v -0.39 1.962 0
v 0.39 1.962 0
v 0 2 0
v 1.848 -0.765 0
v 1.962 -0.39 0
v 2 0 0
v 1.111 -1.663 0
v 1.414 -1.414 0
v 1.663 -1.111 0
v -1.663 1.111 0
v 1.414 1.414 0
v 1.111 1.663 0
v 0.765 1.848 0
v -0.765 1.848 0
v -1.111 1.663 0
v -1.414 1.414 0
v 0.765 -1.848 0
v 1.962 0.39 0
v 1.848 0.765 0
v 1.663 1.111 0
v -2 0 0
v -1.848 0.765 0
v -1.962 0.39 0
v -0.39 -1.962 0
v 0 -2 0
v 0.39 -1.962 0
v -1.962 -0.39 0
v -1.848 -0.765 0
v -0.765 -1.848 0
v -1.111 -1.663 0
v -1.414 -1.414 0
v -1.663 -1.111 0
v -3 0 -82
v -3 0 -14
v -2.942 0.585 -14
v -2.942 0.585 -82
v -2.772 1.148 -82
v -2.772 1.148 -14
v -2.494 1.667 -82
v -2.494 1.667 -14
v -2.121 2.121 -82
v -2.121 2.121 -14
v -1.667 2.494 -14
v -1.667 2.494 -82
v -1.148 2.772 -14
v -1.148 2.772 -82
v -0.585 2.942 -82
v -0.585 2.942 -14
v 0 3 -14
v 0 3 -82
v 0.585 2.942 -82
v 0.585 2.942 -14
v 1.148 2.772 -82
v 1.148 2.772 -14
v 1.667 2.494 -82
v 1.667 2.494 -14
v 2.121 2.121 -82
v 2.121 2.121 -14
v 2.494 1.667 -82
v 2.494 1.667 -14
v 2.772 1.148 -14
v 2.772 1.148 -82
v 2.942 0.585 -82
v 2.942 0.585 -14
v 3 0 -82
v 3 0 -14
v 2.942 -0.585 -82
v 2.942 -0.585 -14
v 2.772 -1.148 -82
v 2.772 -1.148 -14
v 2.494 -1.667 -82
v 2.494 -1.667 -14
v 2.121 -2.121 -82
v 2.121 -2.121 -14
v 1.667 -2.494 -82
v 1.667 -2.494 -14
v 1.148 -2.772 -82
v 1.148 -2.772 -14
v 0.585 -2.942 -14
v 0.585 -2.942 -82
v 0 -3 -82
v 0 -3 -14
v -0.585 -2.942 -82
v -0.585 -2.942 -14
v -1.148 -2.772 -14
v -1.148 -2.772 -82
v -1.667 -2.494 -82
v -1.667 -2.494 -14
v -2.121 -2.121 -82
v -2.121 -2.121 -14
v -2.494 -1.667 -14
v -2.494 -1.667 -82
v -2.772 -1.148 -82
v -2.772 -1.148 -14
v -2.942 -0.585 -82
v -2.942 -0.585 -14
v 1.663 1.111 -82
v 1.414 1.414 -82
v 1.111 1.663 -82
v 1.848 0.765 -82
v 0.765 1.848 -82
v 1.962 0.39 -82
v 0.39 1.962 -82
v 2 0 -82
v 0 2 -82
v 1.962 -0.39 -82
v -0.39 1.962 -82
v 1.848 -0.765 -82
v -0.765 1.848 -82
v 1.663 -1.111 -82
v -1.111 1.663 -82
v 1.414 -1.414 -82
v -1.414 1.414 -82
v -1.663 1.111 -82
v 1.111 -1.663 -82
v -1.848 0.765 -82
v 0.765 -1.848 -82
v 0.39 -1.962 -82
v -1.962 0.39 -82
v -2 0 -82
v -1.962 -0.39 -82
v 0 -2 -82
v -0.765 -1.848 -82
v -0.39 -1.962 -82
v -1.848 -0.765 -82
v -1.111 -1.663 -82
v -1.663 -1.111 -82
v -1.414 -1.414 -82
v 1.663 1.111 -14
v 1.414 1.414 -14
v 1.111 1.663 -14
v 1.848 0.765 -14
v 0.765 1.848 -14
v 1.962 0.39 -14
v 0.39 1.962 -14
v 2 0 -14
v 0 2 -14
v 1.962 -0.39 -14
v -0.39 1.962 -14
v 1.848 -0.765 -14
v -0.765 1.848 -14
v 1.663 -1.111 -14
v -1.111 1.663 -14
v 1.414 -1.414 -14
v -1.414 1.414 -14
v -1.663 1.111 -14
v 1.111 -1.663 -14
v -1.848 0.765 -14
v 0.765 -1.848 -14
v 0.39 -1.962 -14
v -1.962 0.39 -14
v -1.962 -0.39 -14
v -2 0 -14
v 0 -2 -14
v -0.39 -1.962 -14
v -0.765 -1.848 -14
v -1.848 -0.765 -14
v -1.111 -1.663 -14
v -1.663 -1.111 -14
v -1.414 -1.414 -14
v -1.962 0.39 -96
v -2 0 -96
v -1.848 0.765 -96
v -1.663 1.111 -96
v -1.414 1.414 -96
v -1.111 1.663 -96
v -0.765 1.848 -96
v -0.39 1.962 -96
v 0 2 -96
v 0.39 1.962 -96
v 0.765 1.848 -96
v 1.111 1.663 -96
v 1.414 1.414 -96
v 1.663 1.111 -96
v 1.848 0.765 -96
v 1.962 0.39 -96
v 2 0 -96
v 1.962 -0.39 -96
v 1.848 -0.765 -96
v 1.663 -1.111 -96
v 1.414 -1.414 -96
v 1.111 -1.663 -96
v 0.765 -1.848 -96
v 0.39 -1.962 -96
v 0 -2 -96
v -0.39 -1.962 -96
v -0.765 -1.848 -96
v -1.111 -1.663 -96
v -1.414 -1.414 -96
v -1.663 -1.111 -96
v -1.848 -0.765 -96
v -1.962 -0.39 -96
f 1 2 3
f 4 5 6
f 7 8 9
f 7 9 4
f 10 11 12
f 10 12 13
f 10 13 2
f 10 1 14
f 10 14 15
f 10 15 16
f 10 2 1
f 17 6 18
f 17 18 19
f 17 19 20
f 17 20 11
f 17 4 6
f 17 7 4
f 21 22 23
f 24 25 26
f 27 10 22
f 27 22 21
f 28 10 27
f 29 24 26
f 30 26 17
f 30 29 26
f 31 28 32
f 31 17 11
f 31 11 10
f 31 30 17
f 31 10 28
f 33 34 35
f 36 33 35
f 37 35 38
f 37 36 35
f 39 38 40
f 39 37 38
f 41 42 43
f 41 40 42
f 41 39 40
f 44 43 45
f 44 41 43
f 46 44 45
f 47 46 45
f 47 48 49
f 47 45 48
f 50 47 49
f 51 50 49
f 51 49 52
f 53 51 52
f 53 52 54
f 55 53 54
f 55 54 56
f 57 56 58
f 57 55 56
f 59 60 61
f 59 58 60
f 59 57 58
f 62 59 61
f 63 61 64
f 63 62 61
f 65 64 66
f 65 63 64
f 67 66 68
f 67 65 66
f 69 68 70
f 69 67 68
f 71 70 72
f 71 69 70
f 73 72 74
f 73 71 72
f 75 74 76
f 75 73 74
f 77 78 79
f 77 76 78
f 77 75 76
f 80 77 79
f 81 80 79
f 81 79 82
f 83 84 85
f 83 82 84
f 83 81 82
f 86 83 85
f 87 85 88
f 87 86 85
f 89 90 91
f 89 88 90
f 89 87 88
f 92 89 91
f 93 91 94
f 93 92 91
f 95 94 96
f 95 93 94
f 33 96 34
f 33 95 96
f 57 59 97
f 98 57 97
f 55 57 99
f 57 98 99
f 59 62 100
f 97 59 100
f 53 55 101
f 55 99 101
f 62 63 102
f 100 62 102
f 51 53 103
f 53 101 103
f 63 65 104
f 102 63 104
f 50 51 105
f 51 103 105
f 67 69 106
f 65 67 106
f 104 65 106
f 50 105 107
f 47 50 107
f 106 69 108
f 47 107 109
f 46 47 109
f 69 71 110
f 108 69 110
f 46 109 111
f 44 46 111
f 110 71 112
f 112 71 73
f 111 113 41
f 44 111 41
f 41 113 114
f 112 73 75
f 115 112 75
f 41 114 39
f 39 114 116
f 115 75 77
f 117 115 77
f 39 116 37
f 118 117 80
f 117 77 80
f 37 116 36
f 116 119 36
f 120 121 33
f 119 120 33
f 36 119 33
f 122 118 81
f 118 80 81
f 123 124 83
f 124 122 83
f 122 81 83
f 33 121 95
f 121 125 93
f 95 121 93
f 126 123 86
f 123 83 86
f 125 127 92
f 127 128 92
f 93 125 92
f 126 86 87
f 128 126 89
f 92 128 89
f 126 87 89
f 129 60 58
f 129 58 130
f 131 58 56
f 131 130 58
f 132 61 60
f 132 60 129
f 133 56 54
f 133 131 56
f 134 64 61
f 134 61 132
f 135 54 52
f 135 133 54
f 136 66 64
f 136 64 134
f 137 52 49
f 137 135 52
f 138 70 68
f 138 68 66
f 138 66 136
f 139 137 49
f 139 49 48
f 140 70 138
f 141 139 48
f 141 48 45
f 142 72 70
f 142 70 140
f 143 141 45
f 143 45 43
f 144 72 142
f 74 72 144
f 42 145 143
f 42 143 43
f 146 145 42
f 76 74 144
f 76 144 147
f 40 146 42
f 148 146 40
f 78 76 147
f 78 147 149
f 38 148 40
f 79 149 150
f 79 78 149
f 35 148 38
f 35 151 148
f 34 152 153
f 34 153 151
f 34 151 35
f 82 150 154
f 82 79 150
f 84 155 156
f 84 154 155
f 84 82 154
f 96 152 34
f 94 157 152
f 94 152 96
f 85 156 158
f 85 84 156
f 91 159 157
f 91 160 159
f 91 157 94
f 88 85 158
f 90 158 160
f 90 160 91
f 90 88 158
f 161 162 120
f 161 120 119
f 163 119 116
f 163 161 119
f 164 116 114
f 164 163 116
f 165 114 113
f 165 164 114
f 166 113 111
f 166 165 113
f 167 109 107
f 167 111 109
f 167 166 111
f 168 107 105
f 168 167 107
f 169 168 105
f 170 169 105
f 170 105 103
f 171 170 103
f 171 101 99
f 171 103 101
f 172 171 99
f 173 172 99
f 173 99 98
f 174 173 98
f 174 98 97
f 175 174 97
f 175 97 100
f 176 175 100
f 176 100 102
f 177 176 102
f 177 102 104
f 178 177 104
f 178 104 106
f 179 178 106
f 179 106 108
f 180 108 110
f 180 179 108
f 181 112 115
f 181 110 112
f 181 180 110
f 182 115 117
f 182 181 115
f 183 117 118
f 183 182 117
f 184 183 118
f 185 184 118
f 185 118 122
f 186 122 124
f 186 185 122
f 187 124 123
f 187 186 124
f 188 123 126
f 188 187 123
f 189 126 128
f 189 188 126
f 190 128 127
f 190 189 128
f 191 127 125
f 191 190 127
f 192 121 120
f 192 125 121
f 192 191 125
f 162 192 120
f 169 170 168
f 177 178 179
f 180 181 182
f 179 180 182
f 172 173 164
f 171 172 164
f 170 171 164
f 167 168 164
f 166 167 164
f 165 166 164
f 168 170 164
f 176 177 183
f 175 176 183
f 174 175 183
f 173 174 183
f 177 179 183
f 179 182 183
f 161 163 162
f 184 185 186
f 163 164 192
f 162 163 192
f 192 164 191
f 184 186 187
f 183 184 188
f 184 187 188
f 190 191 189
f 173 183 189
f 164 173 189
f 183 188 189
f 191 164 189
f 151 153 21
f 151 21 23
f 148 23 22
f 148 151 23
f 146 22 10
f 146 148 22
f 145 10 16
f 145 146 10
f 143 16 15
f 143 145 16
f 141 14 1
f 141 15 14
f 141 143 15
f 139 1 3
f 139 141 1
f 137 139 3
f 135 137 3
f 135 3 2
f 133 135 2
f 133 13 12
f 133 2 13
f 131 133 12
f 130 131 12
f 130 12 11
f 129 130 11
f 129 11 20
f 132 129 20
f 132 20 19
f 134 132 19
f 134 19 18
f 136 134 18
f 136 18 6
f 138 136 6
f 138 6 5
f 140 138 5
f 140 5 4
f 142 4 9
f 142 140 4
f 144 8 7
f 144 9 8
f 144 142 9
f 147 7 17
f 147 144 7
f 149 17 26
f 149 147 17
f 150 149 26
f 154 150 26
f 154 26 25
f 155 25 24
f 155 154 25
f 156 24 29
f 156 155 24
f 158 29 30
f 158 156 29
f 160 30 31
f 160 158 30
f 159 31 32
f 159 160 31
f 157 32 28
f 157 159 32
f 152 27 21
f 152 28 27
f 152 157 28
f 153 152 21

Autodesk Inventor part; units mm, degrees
ref_plane "YZ Plane" through (0, 0, 0) normal (1, 0, 0) x (0, 1, 0)
ref_plane "XZ Plane" through (0, 0, 0) normal (0, 1, 0) x (-1, 0, 0)
ref_plane "XY Plane" through (0, 0, 0) normal (0, 0, 1) x (1, 0, 0)
sketch "Skizze1" plane through (0, 0, 0) normal (0, 1, 0) x (-1, 0, 0)
  line L0 (0, 0) -> (2, 0)
  line L1 (2, 0) -> (2, -14)
  line L2 (2, -14) -> (3, -14)
  line L3 (3, -14) -> (3, -82)
  line L4 (3, -82) -> (2, -82)
  line L5 (2, -82) -> (2, -96)
  line L6 (2, -96) -> (0, -96)
  line L7 (0, -96) -> (0, 0)
  point P0 (1, -96)
  dimension "d0" = 96
  dimension "d1" = 68
  dimension "d2" = 14
  dimension "d3" = 4
  dimension "d4" = 6
revolve "Umdrehung1" add sketch "Skizze1" angle 360 about axis through (0, 0, -96) along (0, 0, 1)
thread "Gewinde1" size "M4x0.7" class "6g" standard "ISO Metric profile" length 11
thread "Gewinde2" size "M4x0.7" class "6g" standard "ISO Metric profile" length 11
properties part number "1018"
